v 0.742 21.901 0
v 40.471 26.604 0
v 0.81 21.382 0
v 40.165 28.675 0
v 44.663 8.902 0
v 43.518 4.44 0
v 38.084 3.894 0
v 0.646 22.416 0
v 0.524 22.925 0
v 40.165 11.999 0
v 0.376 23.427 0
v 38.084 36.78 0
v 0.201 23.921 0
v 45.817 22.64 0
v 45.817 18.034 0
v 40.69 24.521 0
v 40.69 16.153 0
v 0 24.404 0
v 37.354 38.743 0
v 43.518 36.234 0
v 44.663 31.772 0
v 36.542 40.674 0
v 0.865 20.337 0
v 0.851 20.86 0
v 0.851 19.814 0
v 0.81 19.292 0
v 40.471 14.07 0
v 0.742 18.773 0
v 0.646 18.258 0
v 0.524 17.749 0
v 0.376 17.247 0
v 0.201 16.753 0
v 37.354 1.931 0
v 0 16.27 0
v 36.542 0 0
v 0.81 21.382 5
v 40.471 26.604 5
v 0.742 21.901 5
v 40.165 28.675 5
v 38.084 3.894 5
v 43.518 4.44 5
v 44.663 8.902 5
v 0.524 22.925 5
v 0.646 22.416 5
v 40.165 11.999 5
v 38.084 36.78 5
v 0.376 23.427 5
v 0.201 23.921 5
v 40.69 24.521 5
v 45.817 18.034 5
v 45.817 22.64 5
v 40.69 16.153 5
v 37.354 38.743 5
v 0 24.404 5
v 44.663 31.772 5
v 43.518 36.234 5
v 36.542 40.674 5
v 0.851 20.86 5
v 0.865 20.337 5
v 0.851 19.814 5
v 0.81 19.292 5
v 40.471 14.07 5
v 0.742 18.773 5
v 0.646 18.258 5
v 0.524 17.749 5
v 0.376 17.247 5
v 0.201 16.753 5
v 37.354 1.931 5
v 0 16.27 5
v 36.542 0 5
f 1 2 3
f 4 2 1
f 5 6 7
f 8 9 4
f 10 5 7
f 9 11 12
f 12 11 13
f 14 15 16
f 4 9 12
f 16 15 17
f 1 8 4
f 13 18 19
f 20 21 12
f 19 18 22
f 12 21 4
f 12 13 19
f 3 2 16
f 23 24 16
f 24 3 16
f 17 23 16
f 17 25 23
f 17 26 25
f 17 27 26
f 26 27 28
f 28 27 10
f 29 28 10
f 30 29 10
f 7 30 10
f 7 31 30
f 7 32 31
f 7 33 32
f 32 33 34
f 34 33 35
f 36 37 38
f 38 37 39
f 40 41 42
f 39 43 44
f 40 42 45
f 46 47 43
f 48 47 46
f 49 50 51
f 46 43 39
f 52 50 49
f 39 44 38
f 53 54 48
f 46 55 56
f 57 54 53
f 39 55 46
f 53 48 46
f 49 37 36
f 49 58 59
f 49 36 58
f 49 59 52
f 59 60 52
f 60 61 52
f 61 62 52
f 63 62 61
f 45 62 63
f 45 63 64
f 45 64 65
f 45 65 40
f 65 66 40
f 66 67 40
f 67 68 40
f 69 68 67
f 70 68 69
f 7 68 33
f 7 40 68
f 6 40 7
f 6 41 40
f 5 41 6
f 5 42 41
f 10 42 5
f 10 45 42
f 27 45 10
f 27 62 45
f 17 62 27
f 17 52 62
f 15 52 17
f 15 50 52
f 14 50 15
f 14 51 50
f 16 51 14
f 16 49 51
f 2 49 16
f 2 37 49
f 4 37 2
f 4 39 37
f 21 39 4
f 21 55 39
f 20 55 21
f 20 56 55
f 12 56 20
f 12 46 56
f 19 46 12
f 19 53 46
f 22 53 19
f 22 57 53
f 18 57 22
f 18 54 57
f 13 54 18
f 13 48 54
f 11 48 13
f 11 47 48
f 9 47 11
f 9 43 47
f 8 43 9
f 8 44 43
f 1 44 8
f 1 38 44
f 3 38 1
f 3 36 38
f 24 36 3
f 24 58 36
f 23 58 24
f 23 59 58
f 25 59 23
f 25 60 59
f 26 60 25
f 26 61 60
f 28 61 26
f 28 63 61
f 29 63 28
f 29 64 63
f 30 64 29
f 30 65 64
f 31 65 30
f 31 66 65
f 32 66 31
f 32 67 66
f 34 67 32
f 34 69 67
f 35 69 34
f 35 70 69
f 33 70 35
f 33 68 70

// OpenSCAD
$fn = 32;

// ----------------------------------------------------------------------
// Gear sector: 3 teeth on 48 degrees
// ----------------------------------------------------------------------

// --- parameters (mm) ---
sector_angle = 48;        // sector angle, degrees
root_r = 50;              // root circle radius
tooth_h = 5;              // tooth height over the root circle
teeth = 3;                // number of teeth on the sector
hub_r = 10;               // hub bore radius
plate_t = 5;              // sector thickness, Z
arc_step = 3;             // sampling step of the root/hub arcs, degrees

tip_r = root_r + tooth_h;  // tip circle radius

profile = [[36.542, 0], [37.354, 1.931], [38.084, 3.894], [43.518, 4.44], [44.663, 8.902], [40.165, 11.999], [40.471, 14.07], [40.69, 16.153], [45.817, 18.034], [45.817, 22.64], [40.69, 24.521], [40.471, 26.604], [40.165, 28.675], [44.663, 31.772], [43.518, 36.234], [38.084, 36.78], [37.354, 38.743], [36.542, 40.674], [0, 24.404], [0.201, 23.921], [0.376, 23.427], [0.524, 22.925], [0.646, 22.416], [0.742, 21.901], [0.81, 21.382], [0.851, 20.86], [0.865, 20.337], [0.851, 19.814], [0.81, 19.292], [0.742, 18.773], [0.646, 18.258], [0.524, 17.749], [0.376, 17.247], [0.201, 16.753], [0, 16.27]];  // primary outline, 35 points, counter clockwise

// --- the one profile operation ---
linear_extrude(height = plate_t) polygon(points = profile);
